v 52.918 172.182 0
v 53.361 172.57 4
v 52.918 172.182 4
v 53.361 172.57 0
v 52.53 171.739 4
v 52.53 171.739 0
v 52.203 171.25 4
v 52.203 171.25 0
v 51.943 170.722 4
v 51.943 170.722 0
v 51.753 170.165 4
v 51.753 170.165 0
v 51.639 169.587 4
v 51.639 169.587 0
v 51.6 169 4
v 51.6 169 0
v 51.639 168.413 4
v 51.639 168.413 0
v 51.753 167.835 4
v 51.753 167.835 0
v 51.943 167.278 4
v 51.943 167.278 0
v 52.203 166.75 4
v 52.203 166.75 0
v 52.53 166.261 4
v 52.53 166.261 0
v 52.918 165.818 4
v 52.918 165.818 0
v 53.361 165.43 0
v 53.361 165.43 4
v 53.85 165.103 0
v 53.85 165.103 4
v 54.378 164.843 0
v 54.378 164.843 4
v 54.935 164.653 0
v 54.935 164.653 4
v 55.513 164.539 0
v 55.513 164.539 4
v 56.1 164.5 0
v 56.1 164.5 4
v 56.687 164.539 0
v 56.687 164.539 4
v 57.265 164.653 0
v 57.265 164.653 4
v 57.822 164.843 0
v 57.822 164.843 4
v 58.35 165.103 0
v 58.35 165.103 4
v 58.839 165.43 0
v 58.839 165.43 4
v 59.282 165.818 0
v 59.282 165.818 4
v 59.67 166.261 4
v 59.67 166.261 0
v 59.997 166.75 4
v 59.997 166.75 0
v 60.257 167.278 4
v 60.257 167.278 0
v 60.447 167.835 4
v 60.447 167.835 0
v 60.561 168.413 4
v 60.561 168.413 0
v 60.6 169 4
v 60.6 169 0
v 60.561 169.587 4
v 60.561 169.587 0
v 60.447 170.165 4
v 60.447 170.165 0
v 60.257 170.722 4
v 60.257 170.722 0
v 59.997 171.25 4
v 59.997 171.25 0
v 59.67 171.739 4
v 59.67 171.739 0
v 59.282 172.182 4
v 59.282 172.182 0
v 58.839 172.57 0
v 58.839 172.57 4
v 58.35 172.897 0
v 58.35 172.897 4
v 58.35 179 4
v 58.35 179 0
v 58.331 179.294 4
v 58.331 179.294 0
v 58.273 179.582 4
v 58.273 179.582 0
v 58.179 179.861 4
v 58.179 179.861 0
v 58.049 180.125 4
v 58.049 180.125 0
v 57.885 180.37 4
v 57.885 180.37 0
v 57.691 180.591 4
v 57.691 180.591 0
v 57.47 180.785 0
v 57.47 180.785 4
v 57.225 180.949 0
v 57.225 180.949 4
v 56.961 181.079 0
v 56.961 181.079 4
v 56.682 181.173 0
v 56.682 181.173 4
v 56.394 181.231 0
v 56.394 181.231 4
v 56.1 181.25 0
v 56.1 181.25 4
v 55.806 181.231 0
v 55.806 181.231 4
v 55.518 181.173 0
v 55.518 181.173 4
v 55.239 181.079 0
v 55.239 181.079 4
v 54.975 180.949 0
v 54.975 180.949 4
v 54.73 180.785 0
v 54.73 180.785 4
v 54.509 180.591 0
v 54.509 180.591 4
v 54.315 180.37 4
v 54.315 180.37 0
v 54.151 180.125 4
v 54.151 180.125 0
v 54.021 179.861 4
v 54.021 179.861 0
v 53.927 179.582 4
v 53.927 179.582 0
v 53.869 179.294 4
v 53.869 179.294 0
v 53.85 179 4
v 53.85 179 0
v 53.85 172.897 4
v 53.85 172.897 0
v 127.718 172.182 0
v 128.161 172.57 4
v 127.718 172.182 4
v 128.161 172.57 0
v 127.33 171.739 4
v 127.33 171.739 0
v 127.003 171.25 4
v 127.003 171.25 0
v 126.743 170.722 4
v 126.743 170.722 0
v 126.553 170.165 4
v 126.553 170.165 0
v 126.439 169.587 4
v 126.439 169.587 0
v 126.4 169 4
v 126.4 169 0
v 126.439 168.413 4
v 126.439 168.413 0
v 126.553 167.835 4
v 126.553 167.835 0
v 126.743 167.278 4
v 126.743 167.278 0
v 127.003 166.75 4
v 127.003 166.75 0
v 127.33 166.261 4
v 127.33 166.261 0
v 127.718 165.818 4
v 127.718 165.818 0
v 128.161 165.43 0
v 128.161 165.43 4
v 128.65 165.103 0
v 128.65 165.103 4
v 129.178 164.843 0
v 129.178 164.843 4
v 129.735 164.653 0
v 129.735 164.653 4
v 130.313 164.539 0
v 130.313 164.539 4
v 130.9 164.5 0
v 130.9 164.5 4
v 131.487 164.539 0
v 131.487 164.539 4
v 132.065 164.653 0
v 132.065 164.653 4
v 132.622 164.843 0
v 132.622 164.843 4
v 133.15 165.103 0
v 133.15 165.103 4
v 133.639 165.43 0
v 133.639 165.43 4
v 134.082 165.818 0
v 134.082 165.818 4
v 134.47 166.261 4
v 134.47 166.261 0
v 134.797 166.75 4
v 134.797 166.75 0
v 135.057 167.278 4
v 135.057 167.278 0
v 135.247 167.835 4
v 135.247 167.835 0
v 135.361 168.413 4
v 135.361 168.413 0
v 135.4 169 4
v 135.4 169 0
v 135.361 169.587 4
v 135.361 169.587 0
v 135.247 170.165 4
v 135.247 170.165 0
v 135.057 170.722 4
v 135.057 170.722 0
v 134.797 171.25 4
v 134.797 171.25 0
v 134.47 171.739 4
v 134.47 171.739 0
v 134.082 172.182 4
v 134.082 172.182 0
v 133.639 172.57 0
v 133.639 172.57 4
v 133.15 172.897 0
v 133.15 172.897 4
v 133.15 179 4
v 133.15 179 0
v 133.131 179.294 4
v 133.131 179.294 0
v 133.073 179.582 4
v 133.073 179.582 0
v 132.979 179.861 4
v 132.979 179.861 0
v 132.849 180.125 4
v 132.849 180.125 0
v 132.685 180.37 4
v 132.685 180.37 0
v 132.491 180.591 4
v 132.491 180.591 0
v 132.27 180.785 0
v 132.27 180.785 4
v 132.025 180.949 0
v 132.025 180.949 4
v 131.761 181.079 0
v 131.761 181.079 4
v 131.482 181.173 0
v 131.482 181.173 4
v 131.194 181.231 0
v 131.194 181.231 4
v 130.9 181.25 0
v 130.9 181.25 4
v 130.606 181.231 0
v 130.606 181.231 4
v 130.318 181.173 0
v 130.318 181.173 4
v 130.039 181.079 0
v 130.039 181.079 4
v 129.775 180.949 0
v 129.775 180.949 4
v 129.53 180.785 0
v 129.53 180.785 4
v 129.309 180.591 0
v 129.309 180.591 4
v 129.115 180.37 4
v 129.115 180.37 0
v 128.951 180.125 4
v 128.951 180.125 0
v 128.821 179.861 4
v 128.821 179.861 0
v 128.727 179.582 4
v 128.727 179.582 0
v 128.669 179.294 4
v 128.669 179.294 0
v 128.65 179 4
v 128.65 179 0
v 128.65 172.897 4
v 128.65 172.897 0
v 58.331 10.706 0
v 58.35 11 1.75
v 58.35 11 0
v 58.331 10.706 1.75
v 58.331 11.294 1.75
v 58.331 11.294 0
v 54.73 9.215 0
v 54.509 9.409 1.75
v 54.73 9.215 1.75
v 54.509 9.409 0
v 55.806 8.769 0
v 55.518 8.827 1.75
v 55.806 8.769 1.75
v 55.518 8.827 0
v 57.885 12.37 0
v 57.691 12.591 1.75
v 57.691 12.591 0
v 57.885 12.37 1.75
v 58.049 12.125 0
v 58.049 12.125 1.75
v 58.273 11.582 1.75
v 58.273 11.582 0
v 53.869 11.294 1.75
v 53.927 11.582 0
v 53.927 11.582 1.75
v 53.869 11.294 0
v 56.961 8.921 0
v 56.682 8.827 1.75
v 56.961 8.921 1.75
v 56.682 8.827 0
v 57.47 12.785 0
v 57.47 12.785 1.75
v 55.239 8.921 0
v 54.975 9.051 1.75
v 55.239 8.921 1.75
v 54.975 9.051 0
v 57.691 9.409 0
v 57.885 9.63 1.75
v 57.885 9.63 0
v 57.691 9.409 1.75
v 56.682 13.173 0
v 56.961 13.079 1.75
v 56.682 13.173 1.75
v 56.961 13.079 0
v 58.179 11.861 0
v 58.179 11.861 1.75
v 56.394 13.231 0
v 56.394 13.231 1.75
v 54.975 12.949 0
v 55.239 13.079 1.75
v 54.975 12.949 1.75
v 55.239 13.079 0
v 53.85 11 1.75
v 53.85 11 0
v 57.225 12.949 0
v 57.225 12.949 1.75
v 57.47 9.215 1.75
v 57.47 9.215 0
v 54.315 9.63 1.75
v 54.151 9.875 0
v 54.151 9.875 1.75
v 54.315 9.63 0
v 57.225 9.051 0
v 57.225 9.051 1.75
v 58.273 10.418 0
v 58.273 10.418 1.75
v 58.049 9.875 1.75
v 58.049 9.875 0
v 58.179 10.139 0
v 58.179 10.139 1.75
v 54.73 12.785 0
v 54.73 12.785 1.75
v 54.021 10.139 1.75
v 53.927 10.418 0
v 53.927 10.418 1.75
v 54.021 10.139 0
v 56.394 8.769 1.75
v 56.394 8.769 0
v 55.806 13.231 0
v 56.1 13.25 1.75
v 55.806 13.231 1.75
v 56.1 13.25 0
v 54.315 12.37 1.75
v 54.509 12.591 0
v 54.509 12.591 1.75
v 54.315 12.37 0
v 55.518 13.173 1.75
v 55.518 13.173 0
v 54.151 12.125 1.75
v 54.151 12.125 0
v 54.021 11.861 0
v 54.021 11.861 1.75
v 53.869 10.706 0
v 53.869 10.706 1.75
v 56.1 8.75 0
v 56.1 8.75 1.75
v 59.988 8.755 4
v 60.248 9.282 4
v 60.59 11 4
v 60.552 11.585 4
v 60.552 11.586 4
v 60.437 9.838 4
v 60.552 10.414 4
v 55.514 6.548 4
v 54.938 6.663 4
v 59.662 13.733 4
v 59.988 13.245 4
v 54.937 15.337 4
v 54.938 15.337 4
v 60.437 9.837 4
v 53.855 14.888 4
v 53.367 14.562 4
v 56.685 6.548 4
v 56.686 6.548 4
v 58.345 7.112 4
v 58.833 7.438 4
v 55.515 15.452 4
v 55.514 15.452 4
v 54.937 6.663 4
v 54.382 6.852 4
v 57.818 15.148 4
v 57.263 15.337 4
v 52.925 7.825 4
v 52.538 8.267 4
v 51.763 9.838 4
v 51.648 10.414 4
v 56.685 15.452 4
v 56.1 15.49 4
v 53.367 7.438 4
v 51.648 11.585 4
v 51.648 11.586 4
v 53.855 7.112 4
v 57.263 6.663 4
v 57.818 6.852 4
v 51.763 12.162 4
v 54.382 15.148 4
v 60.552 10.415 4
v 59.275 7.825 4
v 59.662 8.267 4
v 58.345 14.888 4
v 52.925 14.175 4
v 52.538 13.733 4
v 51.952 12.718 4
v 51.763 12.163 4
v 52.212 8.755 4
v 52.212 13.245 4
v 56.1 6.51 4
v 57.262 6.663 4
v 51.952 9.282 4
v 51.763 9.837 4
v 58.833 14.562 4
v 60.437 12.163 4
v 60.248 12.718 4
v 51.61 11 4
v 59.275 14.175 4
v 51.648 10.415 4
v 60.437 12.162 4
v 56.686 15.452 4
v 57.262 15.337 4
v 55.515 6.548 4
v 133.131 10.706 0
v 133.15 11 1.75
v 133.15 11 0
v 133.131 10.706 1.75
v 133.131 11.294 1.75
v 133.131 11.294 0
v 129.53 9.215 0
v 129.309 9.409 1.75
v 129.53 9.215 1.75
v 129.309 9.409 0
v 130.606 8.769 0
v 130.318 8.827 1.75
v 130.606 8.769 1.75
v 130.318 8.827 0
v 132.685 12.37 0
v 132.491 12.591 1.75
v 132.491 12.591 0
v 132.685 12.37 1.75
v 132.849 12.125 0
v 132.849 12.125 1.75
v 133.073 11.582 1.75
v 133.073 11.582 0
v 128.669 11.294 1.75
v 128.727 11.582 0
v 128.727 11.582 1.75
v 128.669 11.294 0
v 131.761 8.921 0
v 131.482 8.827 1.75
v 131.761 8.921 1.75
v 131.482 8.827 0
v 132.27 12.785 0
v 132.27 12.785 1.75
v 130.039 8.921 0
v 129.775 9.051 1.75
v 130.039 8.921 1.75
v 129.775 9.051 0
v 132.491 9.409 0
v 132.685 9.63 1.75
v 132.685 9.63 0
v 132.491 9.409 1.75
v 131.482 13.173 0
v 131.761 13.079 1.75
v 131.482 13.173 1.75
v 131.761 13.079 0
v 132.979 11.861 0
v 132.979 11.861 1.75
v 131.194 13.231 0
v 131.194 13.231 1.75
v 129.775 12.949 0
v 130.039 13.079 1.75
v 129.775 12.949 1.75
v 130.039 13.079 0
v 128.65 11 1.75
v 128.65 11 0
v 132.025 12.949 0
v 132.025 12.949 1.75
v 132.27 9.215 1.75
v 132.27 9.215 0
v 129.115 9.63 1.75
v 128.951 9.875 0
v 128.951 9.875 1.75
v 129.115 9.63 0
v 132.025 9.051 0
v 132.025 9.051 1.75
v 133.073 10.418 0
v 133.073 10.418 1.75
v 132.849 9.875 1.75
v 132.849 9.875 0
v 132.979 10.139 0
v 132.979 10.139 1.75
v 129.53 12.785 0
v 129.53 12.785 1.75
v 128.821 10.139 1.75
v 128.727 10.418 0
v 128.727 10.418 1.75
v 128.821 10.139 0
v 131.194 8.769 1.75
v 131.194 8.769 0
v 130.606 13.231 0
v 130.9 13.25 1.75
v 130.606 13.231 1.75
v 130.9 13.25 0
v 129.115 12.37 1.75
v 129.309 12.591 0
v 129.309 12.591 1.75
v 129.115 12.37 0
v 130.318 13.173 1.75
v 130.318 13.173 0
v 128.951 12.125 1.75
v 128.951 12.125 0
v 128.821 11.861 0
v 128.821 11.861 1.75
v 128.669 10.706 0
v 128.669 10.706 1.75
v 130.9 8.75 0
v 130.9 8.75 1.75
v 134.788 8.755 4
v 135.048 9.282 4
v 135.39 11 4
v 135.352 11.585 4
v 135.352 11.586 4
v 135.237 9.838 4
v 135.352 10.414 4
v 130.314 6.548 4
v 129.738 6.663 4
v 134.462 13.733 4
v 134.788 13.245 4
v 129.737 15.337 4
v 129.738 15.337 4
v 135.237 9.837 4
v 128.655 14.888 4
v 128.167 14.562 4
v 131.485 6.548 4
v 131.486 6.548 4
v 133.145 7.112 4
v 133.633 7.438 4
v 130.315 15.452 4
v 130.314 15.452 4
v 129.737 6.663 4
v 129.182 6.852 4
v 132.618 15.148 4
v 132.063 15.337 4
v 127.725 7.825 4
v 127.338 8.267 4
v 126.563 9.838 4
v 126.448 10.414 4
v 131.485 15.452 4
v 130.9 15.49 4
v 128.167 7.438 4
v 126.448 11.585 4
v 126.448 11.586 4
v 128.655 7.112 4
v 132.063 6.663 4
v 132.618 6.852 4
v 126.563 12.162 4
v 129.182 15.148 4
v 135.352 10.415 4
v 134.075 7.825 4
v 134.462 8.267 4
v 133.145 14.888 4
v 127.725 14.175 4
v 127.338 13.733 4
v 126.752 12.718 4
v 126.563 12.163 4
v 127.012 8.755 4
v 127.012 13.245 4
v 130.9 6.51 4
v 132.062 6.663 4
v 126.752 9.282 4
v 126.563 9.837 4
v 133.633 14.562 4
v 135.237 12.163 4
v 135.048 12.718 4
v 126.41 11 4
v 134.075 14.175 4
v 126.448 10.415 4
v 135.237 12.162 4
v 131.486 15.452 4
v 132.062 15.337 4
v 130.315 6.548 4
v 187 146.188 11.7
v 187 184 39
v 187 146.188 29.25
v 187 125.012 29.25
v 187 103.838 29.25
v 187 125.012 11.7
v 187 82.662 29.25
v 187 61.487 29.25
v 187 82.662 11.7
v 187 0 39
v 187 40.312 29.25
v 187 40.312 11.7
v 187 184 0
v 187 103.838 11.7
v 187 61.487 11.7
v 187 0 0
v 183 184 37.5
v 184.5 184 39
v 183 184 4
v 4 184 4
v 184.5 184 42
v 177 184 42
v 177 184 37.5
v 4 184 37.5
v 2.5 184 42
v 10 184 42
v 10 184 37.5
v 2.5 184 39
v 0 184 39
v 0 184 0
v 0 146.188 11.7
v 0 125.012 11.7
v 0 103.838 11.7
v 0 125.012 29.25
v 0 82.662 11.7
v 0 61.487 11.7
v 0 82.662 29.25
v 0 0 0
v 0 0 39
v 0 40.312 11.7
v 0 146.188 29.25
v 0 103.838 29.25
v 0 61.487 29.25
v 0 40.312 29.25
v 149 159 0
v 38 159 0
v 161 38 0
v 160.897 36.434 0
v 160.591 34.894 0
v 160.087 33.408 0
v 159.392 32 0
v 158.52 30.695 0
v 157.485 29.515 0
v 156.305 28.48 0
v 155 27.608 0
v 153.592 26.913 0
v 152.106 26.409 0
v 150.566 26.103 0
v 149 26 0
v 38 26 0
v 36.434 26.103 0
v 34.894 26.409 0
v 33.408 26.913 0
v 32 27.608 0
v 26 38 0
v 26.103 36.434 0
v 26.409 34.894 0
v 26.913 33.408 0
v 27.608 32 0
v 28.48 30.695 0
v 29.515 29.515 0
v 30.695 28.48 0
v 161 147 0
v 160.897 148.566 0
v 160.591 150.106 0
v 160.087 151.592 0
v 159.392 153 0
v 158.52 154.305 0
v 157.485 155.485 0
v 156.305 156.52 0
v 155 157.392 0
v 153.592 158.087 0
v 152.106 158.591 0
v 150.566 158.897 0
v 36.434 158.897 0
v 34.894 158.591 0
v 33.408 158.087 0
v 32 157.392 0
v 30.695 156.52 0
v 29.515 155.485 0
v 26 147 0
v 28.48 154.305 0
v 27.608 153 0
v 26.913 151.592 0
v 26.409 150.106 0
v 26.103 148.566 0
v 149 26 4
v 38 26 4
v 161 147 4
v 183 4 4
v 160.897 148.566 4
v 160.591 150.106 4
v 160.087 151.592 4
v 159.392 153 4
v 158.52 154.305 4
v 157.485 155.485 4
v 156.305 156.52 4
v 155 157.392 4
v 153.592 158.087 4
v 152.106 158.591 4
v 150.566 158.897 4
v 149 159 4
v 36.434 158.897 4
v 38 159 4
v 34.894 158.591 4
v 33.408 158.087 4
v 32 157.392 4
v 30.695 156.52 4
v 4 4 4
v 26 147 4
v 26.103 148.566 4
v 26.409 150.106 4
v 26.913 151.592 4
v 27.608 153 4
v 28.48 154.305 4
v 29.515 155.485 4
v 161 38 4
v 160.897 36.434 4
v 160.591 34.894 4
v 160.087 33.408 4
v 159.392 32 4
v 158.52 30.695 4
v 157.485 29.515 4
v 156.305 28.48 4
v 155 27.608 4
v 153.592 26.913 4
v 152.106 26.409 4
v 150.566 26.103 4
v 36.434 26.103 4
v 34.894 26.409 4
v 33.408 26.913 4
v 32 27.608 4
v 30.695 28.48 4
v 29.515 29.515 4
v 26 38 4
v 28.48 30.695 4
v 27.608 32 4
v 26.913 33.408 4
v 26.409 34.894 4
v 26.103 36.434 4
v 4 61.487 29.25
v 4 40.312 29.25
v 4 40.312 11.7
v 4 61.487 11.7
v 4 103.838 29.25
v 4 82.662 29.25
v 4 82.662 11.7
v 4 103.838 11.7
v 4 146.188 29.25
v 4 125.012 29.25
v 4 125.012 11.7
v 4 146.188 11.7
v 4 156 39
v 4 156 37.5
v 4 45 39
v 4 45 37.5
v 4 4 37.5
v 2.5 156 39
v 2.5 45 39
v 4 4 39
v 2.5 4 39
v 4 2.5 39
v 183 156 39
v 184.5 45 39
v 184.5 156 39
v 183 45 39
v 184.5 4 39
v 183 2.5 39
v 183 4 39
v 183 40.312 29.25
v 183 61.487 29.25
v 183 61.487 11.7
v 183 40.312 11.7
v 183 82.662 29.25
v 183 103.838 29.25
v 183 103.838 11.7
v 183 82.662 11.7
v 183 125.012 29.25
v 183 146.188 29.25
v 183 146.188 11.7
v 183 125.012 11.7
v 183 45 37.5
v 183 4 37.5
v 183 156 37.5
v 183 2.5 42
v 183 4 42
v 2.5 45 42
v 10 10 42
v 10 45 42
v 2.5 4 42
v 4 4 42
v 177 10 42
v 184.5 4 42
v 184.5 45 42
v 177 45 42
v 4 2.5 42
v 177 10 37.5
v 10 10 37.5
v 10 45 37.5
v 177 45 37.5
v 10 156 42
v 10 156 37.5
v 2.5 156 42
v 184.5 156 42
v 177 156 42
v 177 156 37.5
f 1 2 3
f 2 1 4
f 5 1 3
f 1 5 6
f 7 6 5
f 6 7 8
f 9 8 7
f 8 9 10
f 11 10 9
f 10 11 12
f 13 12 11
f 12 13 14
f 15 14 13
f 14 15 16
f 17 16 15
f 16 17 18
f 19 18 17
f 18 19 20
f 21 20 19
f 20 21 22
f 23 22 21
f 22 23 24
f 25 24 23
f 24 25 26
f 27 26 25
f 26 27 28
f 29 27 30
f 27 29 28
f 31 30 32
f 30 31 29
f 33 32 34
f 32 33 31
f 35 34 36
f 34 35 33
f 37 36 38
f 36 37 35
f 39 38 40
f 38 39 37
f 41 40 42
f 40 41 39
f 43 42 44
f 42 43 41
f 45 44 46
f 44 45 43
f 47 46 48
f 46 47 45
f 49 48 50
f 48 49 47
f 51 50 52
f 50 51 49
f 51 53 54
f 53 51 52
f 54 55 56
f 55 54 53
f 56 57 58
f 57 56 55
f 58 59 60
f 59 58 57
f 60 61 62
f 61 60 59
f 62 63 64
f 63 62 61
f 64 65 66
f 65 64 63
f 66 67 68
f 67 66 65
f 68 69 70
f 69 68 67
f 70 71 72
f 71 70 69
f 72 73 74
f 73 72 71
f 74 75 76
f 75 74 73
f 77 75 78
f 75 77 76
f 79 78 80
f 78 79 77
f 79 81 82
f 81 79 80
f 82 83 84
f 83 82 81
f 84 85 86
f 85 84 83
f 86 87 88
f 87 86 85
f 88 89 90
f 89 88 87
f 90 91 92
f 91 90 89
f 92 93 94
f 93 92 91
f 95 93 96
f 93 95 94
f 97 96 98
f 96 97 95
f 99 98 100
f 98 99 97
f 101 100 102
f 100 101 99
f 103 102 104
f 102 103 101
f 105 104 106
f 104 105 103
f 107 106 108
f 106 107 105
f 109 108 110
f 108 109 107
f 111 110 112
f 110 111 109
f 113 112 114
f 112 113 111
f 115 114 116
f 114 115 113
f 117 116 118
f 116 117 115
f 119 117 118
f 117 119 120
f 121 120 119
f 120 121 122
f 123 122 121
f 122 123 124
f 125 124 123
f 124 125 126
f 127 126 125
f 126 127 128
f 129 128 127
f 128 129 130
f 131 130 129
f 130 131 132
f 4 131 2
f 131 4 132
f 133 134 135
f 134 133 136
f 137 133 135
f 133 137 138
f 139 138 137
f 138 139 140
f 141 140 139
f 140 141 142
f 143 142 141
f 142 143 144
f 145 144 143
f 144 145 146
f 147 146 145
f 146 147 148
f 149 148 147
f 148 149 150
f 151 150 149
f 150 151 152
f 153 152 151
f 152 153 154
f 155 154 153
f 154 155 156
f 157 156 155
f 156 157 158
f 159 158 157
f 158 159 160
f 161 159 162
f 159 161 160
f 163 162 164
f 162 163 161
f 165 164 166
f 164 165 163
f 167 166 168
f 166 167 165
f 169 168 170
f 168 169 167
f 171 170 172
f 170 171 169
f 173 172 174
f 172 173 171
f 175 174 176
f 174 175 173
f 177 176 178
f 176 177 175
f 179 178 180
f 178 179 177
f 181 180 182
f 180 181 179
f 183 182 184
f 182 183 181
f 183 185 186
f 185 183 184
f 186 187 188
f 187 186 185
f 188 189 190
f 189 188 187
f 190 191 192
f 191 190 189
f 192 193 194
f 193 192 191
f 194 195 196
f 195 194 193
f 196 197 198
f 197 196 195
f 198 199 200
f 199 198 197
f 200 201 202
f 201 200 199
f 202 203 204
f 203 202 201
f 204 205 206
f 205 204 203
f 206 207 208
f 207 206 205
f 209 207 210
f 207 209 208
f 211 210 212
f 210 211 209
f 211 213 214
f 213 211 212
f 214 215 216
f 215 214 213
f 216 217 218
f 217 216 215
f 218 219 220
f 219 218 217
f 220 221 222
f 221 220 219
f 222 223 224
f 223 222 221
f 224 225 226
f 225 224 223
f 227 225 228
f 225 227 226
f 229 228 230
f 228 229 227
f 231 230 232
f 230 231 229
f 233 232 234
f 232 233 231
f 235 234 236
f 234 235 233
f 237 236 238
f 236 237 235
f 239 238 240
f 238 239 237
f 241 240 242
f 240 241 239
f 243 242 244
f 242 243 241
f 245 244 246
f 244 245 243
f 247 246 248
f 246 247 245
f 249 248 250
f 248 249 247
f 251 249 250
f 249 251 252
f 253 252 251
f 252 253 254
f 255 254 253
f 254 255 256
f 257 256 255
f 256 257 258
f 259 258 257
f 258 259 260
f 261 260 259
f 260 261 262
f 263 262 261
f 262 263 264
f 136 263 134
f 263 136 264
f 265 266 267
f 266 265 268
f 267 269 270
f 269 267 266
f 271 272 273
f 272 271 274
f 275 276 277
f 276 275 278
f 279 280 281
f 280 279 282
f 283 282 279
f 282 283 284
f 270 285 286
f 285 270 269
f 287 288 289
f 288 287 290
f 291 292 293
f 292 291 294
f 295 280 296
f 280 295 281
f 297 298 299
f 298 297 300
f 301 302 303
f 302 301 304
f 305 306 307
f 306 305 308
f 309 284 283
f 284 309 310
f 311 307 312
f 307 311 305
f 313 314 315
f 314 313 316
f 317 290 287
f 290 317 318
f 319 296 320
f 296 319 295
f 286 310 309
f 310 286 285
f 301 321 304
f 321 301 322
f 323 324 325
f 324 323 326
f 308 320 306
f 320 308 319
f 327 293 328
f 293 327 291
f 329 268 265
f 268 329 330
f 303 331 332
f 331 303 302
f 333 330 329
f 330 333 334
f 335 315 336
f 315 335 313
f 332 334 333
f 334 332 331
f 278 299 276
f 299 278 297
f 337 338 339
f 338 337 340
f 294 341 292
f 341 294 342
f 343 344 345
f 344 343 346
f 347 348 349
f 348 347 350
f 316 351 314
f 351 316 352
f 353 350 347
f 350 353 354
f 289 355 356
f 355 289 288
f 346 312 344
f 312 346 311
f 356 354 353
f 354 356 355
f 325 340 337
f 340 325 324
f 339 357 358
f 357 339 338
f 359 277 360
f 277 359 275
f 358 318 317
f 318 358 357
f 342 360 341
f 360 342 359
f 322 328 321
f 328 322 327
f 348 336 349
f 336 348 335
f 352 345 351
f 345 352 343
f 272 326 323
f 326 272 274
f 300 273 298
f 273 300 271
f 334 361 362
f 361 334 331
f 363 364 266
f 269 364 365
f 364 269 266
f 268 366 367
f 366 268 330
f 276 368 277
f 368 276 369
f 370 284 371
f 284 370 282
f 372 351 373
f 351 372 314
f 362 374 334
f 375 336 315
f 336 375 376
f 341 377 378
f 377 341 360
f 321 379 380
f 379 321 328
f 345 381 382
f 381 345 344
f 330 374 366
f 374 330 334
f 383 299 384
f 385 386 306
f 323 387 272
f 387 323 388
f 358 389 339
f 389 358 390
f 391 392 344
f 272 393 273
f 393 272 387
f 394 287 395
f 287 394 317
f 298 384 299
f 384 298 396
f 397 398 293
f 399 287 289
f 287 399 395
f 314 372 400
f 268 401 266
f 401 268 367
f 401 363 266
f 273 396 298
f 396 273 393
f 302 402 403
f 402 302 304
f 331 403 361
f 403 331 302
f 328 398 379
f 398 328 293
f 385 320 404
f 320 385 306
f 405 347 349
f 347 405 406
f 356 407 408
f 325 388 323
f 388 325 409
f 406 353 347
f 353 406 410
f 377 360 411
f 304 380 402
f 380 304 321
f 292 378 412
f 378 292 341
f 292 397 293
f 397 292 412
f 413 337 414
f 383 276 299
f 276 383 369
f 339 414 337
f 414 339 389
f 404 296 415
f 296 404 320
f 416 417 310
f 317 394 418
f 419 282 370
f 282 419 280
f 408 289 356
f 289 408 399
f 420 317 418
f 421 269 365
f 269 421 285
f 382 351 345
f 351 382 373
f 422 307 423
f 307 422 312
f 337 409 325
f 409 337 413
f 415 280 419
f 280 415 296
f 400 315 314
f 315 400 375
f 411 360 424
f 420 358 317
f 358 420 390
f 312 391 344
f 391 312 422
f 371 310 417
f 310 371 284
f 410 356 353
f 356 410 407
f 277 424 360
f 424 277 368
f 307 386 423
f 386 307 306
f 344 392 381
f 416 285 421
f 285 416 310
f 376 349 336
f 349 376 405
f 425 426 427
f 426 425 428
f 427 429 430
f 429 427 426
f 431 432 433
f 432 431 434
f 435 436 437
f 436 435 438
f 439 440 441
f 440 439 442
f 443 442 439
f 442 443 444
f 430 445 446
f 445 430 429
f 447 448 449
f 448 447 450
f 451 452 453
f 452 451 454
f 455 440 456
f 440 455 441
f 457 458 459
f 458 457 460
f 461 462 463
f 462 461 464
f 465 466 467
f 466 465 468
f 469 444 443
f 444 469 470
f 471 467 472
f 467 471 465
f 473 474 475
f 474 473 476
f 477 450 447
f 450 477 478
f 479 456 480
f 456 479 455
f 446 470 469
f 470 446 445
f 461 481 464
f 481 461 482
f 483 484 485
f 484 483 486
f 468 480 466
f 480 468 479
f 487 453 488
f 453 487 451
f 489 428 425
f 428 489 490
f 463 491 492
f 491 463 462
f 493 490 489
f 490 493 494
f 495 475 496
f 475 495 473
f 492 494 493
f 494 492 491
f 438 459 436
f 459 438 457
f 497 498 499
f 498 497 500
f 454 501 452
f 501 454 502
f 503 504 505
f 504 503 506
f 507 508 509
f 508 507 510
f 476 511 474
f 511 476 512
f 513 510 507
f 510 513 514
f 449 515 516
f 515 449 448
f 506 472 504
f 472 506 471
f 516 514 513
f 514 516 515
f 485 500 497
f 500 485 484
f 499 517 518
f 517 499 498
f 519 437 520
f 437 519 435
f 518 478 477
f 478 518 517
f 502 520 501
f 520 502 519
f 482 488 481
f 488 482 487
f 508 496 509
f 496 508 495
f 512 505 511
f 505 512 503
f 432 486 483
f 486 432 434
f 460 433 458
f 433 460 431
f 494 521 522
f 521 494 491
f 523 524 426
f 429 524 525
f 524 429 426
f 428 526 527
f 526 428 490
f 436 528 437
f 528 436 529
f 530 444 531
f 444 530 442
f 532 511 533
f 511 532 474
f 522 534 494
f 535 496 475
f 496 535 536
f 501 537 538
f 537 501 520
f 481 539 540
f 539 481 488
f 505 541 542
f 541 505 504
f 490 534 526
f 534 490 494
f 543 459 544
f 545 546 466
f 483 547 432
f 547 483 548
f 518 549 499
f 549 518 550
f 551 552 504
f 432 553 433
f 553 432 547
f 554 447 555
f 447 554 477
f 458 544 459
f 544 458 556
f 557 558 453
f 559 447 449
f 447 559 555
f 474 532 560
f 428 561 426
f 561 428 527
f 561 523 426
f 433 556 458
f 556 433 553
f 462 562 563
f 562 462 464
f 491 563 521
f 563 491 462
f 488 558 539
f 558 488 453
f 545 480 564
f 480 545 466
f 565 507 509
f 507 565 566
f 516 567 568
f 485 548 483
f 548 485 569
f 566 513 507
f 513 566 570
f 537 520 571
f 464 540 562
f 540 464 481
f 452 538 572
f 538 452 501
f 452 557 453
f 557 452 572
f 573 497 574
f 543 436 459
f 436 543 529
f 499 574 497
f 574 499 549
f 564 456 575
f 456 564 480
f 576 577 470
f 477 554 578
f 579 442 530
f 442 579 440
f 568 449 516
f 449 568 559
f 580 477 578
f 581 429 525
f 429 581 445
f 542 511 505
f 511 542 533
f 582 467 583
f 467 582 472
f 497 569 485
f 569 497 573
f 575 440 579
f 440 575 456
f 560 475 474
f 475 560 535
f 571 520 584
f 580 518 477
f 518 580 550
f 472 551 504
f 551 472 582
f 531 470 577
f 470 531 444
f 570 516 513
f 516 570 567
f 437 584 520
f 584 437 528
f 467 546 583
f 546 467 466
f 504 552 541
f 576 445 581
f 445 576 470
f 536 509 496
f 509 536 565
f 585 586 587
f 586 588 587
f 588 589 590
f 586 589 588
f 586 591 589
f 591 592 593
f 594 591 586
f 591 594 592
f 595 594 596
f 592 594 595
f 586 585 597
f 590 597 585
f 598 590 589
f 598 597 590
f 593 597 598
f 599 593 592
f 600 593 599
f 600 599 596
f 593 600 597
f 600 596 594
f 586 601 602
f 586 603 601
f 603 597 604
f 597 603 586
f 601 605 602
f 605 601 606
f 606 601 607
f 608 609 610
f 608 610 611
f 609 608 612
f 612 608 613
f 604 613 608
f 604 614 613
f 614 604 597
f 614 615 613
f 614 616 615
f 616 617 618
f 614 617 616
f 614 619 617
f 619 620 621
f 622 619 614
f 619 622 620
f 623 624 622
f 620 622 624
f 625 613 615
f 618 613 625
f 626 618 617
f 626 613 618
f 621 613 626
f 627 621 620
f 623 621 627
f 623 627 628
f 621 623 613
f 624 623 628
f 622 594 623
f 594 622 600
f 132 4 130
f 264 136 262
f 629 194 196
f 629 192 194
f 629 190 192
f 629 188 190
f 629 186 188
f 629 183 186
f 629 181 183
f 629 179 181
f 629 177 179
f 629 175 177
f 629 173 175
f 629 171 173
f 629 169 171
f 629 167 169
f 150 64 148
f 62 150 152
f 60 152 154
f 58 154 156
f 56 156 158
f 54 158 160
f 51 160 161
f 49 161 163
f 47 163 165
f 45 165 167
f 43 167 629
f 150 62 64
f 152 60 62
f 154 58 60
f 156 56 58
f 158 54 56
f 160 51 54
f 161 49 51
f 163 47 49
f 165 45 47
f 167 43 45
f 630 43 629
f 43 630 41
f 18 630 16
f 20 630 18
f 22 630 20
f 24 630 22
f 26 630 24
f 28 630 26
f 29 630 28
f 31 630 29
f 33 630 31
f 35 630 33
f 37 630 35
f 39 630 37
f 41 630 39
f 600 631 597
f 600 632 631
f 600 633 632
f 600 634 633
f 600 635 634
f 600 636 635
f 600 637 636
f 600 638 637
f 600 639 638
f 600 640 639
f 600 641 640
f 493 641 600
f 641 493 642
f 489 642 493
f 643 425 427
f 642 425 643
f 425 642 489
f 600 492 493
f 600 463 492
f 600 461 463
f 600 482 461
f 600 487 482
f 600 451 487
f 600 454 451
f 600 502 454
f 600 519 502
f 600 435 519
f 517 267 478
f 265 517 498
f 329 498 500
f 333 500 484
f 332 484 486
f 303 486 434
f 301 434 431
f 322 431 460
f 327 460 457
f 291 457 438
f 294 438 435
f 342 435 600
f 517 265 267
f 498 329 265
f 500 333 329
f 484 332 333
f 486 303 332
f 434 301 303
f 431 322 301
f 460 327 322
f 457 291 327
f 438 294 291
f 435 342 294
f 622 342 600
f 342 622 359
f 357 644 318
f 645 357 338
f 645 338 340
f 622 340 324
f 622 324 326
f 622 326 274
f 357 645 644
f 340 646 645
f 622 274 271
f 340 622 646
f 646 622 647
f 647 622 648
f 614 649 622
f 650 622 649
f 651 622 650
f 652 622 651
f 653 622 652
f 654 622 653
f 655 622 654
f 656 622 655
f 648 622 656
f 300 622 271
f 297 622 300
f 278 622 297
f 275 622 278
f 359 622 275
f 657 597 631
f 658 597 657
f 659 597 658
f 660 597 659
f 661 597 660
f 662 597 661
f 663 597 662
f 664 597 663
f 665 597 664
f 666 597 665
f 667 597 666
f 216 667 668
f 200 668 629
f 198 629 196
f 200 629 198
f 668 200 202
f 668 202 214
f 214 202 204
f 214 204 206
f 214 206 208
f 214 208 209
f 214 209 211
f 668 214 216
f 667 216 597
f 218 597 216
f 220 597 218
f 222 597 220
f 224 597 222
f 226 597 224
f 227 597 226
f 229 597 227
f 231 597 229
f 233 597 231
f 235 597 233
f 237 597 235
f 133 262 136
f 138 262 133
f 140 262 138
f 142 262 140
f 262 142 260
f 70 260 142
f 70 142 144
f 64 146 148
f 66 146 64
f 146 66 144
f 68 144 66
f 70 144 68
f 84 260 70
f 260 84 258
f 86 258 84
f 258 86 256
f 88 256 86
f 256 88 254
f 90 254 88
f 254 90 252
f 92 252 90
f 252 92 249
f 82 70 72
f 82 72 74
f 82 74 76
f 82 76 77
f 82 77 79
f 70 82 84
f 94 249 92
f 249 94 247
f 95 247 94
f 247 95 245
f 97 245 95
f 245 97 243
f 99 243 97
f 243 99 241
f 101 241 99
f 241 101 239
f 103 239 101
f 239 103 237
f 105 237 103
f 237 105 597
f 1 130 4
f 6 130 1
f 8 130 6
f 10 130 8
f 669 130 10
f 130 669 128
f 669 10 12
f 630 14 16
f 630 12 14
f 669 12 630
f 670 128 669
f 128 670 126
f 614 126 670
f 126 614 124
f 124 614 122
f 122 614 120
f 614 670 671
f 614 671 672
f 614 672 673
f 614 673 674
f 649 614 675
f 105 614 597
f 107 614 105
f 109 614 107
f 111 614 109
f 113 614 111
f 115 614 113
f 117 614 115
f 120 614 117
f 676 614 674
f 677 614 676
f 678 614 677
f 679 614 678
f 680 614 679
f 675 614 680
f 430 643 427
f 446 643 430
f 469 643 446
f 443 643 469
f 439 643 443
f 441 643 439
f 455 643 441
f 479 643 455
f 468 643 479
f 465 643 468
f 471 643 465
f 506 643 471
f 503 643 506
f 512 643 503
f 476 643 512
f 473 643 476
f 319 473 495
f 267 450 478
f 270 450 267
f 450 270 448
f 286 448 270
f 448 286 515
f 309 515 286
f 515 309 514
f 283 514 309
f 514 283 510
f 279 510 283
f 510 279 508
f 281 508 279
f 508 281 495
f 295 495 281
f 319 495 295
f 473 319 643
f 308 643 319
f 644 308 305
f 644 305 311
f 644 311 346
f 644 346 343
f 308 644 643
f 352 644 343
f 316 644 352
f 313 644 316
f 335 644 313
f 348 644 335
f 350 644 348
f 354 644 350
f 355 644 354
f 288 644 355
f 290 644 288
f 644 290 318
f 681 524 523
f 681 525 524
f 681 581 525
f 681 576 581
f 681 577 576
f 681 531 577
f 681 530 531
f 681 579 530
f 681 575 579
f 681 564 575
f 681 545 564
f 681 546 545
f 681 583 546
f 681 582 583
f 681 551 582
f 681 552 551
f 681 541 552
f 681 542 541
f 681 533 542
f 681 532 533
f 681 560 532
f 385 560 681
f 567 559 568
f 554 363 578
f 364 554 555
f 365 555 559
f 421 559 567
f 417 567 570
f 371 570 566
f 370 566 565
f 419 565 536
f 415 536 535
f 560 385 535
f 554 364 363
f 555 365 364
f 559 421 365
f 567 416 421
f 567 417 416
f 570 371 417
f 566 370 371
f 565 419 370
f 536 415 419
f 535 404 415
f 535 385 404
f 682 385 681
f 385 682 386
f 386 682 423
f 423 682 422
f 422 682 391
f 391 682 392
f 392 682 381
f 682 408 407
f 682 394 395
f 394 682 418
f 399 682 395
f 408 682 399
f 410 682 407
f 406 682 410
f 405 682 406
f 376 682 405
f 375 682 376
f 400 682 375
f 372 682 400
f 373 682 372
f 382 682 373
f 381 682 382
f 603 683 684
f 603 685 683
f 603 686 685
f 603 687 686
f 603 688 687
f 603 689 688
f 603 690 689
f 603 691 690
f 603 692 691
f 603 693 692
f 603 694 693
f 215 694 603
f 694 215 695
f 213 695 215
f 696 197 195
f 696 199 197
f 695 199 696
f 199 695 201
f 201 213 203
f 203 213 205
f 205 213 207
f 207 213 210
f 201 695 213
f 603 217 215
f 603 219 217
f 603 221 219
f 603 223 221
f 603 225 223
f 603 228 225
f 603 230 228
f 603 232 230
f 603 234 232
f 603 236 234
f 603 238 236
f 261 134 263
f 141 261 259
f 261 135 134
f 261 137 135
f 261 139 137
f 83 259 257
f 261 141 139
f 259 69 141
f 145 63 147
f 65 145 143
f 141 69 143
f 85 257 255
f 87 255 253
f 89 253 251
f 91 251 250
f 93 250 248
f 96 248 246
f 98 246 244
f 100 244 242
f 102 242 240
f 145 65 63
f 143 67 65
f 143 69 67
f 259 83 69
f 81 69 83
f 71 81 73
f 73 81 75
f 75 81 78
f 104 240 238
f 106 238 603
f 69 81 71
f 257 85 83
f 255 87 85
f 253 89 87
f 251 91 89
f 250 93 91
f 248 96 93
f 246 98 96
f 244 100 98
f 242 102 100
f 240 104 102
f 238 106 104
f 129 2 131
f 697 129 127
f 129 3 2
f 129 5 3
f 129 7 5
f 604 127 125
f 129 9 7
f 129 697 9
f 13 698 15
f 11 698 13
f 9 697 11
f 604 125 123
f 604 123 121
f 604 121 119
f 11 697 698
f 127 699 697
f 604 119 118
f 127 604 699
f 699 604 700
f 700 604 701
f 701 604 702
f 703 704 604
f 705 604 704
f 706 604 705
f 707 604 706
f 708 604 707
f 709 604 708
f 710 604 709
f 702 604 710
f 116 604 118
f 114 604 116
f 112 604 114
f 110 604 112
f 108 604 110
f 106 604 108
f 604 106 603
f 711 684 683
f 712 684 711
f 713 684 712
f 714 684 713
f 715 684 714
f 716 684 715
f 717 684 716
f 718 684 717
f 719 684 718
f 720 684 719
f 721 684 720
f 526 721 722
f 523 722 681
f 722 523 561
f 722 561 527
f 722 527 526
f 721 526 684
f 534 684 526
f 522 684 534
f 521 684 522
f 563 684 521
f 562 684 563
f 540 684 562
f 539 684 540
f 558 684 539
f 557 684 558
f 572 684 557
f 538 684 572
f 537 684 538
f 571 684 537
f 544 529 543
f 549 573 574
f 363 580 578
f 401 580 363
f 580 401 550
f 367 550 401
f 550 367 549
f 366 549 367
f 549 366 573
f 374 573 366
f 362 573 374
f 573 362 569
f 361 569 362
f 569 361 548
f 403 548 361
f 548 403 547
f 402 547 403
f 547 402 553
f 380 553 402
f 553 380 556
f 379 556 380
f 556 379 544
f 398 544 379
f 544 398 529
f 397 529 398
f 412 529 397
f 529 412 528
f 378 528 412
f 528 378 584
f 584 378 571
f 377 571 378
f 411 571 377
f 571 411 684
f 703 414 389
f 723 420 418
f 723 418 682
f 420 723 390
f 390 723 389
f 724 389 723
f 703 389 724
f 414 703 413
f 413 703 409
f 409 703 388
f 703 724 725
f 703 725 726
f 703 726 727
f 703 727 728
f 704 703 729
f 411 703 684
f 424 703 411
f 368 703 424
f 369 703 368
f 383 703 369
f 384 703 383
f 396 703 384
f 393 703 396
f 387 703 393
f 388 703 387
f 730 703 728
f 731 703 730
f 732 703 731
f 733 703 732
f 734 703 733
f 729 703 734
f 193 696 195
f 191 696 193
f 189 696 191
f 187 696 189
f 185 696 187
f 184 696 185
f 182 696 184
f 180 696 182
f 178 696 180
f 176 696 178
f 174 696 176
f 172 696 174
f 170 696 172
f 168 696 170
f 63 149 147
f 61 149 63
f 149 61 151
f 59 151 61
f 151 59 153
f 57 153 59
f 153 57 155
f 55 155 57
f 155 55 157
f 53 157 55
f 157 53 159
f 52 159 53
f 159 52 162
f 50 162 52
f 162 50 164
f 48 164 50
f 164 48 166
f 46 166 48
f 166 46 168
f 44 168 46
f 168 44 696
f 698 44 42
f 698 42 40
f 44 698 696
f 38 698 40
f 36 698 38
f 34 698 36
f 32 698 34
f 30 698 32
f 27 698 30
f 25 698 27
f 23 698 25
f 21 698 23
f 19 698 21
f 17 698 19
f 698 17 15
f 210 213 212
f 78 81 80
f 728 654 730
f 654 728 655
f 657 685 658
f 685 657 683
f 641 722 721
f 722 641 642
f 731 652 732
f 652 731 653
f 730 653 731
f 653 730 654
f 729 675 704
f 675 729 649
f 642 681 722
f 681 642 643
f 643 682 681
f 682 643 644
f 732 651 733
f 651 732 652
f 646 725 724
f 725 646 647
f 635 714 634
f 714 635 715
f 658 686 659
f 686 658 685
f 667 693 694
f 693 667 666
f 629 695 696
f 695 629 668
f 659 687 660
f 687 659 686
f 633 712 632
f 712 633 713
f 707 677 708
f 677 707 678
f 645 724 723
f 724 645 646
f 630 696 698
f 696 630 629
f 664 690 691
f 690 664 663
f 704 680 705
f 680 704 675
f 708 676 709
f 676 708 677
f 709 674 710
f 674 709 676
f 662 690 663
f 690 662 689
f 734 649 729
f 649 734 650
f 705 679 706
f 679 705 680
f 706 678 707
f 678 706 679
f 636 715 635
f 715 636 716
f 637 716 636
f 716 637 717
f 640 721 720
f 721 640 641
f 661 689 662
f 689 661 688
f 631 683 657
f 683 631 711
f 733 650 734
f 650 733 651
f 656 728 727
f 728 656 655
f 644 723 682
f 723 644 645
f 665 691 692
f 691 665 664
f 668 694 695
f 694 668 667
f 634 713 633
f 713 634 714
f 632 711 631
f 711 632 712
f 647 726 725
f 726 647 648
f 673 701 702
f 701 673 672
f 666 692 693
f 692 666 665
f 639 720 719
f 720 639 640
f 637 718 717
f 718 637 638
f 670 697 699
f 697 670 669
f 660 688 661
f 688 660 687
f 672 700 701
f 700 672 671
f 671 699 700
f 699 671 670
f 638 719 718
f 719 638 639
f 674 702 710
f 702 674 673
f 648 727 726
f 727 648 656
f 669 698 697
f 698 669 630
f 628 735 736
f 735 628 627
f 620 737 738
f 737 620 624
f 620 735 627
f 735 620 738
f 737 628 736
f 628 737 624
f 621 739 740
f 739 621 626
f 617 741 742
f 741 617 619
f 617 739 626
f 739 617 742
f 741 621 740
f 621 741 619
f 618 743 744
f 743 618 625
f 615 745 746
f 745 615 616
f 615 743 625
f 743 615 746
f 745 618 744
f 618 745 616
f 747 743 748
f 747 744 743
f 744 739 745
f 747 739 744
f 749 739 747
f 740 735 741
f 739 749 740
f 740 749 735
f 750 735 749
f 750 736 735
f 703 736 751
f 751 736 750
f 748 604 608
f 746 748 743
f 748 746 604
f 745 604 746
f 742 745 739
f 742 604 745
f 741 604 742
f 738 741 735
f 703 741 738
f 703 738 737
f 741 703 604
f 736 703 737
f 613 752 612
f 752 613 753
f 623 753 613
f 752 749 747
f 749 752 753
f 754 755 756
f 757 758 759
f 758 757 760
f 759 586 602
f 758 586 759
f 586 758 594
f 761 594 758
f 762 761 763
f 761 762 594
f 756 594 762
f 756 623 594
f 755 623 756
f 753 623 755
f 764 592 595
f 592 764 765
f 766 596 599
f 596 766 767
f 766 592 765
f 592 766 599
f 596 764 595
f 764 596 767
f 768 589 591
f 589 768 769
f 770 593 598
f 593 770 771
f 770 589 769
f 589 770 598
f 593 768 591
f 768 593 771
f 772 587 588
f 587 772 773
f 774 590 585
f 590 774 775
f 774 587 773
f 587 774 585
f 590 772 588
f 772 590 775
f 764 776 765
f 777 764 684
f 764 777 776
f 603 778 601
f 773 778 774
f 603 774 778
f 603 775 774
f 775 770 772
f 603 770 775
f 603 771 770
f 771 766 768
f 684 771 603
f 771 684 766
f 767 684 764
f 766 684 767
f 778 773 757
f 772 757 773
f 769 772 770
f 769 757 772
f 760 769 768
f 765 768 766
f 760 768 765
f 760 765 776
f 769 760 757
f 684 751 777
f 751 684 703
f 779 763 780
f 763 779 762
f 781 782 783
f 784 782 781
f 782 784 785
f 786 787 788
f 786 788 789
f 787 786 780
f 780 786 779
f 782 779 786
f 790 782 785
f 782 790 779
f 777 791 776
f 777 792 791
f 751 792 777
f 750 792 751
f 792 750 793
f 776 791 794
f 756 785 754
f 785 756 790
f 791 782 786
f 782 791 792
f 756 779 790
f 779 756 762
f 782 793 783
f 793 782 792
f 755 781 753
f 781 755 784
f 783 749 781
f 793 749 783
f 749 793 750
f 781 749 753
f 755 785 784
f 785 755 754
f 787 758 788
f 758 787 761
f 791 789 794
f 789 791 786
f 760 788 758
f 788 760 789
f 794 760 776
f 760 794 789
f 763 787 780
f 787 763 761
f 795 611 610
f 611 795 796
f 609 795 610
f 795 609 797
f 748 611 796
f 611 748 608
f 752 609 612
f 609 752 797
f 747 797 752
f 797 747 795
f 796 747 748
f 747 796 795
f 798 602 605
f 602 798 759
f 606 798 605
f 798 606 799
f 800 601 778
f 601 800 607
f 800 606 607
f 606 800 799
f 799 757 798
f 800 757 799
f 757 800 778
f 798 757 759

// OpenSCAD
// HP Elite Mini 800 G9 Vertical Wall Mount
//
// A wall cradle that holds the mini PC flat against the wall in "portrait"
// (vertical) orientation. The lower edge drops into a fully-captured pocket
// (back / front lip / two sides) that carries the weight, while the upper
// edge is held to the wall by two top hooks. The back panel has a large
// ventilation window and keyhole slots for tool-free hanging on wall screws.
//
// Inspired by community "HP Elite Mini 800 G9 vertical mount" designs.
//
// ORIENTATION (in use): the back panel lies flat on the wall; the device's
// large face sits against it and its depth runs vertically. Mount it with the
// rear I/O edge at the OPEN top so ports and cables stay accessible.
//
// PRINT ORIENTATION: as modelled — back panel flat on the bed, walls/hooks
// pointing up (+Z is "out from the wall"). No supports needed; the retaining
// lips are short self-supporting overhangs. Use 3+ perimeters for wall/hook
// strength and print in PETG/ABS for heat tolerance near the PC's exhaust.

/* [Device Dimensions] */
// Device width (HP Elite Mini 800 G9 is 177mm)
device_width = 177; // [120:1:260]
// Device depth — runs vertically up the wall (G9 is 175mm)
device_depth = 175; // [120:1:260]
// Device thickness — protrudes out from the wall (G9 is 34mm)
device_thickness = 34; // [20:1:80]

/* [Fit] */
// Clearance added around the device on each side
clearance = 1; // [0.25:0.25:3]

/* [Cradle] */
// Perimeter wall / rail thickness
wall_thickness = 4; // [2:0.5:8]
// Back panel thickness (sits against the wall)
back_thickness = 4; // [2:0.5:8]
// Height of the bottom capture pocket that fully grips the lower edge
pocket_height = 45; // [25:1:90]
// How far retaining lips reach inward over the device's outer face
lip_reach = 6; // [3:0.5:12]
// Lip thickness (measured out from the wall)
lip_thickness = 3; // [2:0.5:6]

/* [Ventilation] */
// Border width of solid back panel around the vent window
vent_margin = 22; // [10:1:40]
// Corner radius of the back-panel vent window
vent_radius = 12; // [0:1:30]
// Number of airflow slots per side rail
rail_slots = 3; // [0:1:6]

/* [Wall Mounting] */
// Screw shank diameter for keyhole slots and bottom screws
screw_shank = 4.5; // [3:0.5:6]
// Screw head diameter (keyhole entry / countersink)
screw_head = 9; // [6:0.5:14]
// Vertical travel of the keyhole slot (hang-and-drop distance)
keyhole_travel = 10; // [6:1:20]

/* [Rendering] */
$fa = 2;
$fn = 48;

/* [Hidden] */
eps = 0.01;

// ---- Derived layout (print orientation: X width, Y up-the-wall, Z out) ----
plate_w = device_width + 2 * clearance + 2 * wall_thickness;   // X
plate_h = wall_thickness + device_depth + clearance + wall_thickness; // Y
cavity_z = back_thickness + device_thickness + clearance;      // top of device
lip_top_z = cavity_z + lip_thickness;

// Device footprint on the panel
dev_x0 = wall_thickness + clearance;
dev_x1 = plate_w - wall_thickness - clearance;
dev_y0 = wall_thickness + clearance;           // rests on the bottom shelf
dev_y1 = dev_y0 + device_depth;

// ============================================================
// Helpers
// ============================================================

// 2D rounded rectangle anchored at origin (corner), rounded corners.
module rrect(w, h, r) {
    rr = min(r, w / 2, h / 2);
    if (rr <= 0) {
        square([w, h]);
    } else {
        hull() {
            for (x = [rr, w - rr], y = [rr, h - rr])
                translate([x, y]) circle(r = rr);
        }
    }
}

// A keyhole cut: large entry circle at the bottom, narrow slot rising +Y.
// Cut through the panel in Z. Positioned by its entry-circle centre.
module keyhole_cut(shank_d, head_d, travel) {
    translate([0, 0, -eps])
    linear_extrude(height = back_thickness + 2 * eps) {
        circle(d = head_d);
        translate([-shank_d / 2, 0]) square([shank_d, travel]);
        translate([0, travel]) circle(d = shank_d);
    }
}

// Countersunk through-hole for a bottom fixing screw. The countersink opens
// toward the interior (+Z) so the flat head sits flush under the device.
module screw_cut(shank_d, head_d) {
    csk = (head_d - shank_d) / 2;
    translate([0, 0, -eps])
        cylinder(h = back_thickness + 2 * eps, d = shank_d);
    translate([0, 0, back_thickness - csk])
        cylinder(h = csk + eps, d1 = shank_d, d2 = head_d);
}

// ============================================================
// Components
// ============================================================

// Solid overlap used everywhere walls/lips meet, so unions stay 2-manifold
// (no measure-zero coincident faces) instead of merely touching.
grab = 1.5;

// Back panel with a rounded ventilation window and wall fixings.
module back_panel() {
    win_w = device_width - 2 * (vent_margin - clearance);
    win_h = device_depth - 2 * (vent_margin - clearance);

    difference() {
        linear_extrude(height = back_thickness)
            rrect(plate_w, plate_h, 4);

        // Ventilation window behind the device.
        if (win_w > 0 && win_h > 0)
            translate([plate_w / 2 - win_w / 2, dev_y0 + (device_depth - win_h) / 2, -eps])
                linear_extrude(height = back_thickness + 2 * eps)
                    rrect(win_w, win_h, vent_radius);

        // Two keyhole slots high on the panel, above the vent window.
        kh_y = dev_y1 - vent_margin / 2;
        for (kx = [plate_w * 0.30, plate_w * 0.70])
            translate([kx, kh_y, 0]) keyhole_cut(screw_shank, screw_head, keyhole_travel);

        // Two countersunk screw holes low on the panel, inside the pocket zone.
        for (sx = [plate_w * 0.30, plate_w * 0.70])
            translate([sx, vent_margin / 2, 0]) screw_cut(screw_shank, screw_head);
    }
}

// One perimeter wall rising to the device's outer face, with airflow slots.
//   ax0..ax1, ay0..ay1 = wall footprint in X/Y; slots run along the long axis.
module perimeter_wall(ax0, ay0, ax1, ay1, slots) {
    w = ax1 - ax0;
    d = ay1 - ay0;
    along_y = d >= w;
    length = along_y ? d : w;

    difference() {
        translate([ax0, ay0, 0]) cube([w, d, cavity_z]);

        if (slots > 0) {
            span = length * 0.7;
            step = span / slots;
            sw = step * 0.5;
            for (i = [0 : slots - 1]) {
                pos = (along_y ? ay0 : ax0) + length * 0.15 + step * (i + 0.5);
                if (along_y)
                    translate([ax0 - eps, pos - sw / 2, cavity_z * 0.30])
                        cube([w + 2 * eps, sw, cavity_z * 0.45]);
                else
                    translate([pos - sw / 2, ay0 - eps, cavity_z * 0.30])
                        cube([sw, d + 2 * eps, cavity_z * 0.45]);
            }
        }
    }
}

// A retaining lip capping a wall top and reaching inward over the device face.
// The lip bites `grab` back into the wall it sits on (a solid weld) and reaches
// `lip_reach` past the wall's inner face over the device.
//   edge: "bottom" reaches +Y, "left" reaches +X, "right" reaches -X
//   x0,y0,x1,y1: the footprint of the wall being capped.
module lip(edge, x0, y0, x1, y1) {
    z0 = cavity_z - grab;                 // bite down into the wall for a solid weld
    h  = grab + lip_thickness;
    if (edge == "bottom")            // shelf wall at Y[y1,y0]; reach inward from y0
        translate([x0, y0 - grab, z0]) cube([x1 - x0, lip_reach + grab, h]);
    else if (edge == "left")         // wall at X[x0,x1]; reach inward from inner face x1
        translate([x1 - grab, y0, z0]) cube([lip_reach + grab, y1 - y0, h]);
    else if (edge == "right")        // wall at X[x0,x1]; reach inward from inner face x0
        translate([x0 - lip_reach, y0, z0]) cube([lip_reach + grab, y1 - y0, h]);
}

// The U of perimeter walls (bottom shelf + two full-height sides).
module walls() {
    // Bottom shelf (carries the device weight in use), full width.
    perimeter_wall(0, 0, plate_w, wall_thickness, 0);
    // Left and right side walls, full height, with airflow slots.
    perimeter_wall(0, wall_thickness - grab, wall_thickness, plate_h, rail_slots);
    perimeter_wall(plate_w - wall_thickness, wall_thickness - grab, plate_w, plate_h, rail_slots);
}

// Retaining lips: full-width bottom lip + short lower-side lips trap the lower
// edge on all sides; two top hooks hold the upper edge to the wall.
module lips() {
    inner_x0 = wall_thickness;
    inner_x1 = plate_w - wall_thickness;

    // Bottom lip over the lower edge.
    lip("bottom", inner_x0, wall_thickness, inner_x1, 0);

    // Lower side lips (within the capture pocket).
    lip("left",  0, wall_thickness, wall_thickness, pocket_height);
    lip("right", plate_w - wall_thickness, wall_thickness, plate_w, pocket_height);

    // Top hooks: inward lips on the top of each side wall.
    hook = 28;  // length of the top hook zone
    lip("left",  0, plate_h - hook, wall_thickness, plate_h);
    lip("right", plate_w - wall_thickness, plate_h - hook, plate_w, plate_h);
}

// ============================================================
// Assembly
// ============================================================
module wall_mount() {
    back_panel();
    walls();
    lips();
}

// Guard: skip rendering when included by another file (e.g. tests).
if (is_undef(RENDER_MOUNT) ? true : RENDER_MOUNT) {
    wall_mount();
}
